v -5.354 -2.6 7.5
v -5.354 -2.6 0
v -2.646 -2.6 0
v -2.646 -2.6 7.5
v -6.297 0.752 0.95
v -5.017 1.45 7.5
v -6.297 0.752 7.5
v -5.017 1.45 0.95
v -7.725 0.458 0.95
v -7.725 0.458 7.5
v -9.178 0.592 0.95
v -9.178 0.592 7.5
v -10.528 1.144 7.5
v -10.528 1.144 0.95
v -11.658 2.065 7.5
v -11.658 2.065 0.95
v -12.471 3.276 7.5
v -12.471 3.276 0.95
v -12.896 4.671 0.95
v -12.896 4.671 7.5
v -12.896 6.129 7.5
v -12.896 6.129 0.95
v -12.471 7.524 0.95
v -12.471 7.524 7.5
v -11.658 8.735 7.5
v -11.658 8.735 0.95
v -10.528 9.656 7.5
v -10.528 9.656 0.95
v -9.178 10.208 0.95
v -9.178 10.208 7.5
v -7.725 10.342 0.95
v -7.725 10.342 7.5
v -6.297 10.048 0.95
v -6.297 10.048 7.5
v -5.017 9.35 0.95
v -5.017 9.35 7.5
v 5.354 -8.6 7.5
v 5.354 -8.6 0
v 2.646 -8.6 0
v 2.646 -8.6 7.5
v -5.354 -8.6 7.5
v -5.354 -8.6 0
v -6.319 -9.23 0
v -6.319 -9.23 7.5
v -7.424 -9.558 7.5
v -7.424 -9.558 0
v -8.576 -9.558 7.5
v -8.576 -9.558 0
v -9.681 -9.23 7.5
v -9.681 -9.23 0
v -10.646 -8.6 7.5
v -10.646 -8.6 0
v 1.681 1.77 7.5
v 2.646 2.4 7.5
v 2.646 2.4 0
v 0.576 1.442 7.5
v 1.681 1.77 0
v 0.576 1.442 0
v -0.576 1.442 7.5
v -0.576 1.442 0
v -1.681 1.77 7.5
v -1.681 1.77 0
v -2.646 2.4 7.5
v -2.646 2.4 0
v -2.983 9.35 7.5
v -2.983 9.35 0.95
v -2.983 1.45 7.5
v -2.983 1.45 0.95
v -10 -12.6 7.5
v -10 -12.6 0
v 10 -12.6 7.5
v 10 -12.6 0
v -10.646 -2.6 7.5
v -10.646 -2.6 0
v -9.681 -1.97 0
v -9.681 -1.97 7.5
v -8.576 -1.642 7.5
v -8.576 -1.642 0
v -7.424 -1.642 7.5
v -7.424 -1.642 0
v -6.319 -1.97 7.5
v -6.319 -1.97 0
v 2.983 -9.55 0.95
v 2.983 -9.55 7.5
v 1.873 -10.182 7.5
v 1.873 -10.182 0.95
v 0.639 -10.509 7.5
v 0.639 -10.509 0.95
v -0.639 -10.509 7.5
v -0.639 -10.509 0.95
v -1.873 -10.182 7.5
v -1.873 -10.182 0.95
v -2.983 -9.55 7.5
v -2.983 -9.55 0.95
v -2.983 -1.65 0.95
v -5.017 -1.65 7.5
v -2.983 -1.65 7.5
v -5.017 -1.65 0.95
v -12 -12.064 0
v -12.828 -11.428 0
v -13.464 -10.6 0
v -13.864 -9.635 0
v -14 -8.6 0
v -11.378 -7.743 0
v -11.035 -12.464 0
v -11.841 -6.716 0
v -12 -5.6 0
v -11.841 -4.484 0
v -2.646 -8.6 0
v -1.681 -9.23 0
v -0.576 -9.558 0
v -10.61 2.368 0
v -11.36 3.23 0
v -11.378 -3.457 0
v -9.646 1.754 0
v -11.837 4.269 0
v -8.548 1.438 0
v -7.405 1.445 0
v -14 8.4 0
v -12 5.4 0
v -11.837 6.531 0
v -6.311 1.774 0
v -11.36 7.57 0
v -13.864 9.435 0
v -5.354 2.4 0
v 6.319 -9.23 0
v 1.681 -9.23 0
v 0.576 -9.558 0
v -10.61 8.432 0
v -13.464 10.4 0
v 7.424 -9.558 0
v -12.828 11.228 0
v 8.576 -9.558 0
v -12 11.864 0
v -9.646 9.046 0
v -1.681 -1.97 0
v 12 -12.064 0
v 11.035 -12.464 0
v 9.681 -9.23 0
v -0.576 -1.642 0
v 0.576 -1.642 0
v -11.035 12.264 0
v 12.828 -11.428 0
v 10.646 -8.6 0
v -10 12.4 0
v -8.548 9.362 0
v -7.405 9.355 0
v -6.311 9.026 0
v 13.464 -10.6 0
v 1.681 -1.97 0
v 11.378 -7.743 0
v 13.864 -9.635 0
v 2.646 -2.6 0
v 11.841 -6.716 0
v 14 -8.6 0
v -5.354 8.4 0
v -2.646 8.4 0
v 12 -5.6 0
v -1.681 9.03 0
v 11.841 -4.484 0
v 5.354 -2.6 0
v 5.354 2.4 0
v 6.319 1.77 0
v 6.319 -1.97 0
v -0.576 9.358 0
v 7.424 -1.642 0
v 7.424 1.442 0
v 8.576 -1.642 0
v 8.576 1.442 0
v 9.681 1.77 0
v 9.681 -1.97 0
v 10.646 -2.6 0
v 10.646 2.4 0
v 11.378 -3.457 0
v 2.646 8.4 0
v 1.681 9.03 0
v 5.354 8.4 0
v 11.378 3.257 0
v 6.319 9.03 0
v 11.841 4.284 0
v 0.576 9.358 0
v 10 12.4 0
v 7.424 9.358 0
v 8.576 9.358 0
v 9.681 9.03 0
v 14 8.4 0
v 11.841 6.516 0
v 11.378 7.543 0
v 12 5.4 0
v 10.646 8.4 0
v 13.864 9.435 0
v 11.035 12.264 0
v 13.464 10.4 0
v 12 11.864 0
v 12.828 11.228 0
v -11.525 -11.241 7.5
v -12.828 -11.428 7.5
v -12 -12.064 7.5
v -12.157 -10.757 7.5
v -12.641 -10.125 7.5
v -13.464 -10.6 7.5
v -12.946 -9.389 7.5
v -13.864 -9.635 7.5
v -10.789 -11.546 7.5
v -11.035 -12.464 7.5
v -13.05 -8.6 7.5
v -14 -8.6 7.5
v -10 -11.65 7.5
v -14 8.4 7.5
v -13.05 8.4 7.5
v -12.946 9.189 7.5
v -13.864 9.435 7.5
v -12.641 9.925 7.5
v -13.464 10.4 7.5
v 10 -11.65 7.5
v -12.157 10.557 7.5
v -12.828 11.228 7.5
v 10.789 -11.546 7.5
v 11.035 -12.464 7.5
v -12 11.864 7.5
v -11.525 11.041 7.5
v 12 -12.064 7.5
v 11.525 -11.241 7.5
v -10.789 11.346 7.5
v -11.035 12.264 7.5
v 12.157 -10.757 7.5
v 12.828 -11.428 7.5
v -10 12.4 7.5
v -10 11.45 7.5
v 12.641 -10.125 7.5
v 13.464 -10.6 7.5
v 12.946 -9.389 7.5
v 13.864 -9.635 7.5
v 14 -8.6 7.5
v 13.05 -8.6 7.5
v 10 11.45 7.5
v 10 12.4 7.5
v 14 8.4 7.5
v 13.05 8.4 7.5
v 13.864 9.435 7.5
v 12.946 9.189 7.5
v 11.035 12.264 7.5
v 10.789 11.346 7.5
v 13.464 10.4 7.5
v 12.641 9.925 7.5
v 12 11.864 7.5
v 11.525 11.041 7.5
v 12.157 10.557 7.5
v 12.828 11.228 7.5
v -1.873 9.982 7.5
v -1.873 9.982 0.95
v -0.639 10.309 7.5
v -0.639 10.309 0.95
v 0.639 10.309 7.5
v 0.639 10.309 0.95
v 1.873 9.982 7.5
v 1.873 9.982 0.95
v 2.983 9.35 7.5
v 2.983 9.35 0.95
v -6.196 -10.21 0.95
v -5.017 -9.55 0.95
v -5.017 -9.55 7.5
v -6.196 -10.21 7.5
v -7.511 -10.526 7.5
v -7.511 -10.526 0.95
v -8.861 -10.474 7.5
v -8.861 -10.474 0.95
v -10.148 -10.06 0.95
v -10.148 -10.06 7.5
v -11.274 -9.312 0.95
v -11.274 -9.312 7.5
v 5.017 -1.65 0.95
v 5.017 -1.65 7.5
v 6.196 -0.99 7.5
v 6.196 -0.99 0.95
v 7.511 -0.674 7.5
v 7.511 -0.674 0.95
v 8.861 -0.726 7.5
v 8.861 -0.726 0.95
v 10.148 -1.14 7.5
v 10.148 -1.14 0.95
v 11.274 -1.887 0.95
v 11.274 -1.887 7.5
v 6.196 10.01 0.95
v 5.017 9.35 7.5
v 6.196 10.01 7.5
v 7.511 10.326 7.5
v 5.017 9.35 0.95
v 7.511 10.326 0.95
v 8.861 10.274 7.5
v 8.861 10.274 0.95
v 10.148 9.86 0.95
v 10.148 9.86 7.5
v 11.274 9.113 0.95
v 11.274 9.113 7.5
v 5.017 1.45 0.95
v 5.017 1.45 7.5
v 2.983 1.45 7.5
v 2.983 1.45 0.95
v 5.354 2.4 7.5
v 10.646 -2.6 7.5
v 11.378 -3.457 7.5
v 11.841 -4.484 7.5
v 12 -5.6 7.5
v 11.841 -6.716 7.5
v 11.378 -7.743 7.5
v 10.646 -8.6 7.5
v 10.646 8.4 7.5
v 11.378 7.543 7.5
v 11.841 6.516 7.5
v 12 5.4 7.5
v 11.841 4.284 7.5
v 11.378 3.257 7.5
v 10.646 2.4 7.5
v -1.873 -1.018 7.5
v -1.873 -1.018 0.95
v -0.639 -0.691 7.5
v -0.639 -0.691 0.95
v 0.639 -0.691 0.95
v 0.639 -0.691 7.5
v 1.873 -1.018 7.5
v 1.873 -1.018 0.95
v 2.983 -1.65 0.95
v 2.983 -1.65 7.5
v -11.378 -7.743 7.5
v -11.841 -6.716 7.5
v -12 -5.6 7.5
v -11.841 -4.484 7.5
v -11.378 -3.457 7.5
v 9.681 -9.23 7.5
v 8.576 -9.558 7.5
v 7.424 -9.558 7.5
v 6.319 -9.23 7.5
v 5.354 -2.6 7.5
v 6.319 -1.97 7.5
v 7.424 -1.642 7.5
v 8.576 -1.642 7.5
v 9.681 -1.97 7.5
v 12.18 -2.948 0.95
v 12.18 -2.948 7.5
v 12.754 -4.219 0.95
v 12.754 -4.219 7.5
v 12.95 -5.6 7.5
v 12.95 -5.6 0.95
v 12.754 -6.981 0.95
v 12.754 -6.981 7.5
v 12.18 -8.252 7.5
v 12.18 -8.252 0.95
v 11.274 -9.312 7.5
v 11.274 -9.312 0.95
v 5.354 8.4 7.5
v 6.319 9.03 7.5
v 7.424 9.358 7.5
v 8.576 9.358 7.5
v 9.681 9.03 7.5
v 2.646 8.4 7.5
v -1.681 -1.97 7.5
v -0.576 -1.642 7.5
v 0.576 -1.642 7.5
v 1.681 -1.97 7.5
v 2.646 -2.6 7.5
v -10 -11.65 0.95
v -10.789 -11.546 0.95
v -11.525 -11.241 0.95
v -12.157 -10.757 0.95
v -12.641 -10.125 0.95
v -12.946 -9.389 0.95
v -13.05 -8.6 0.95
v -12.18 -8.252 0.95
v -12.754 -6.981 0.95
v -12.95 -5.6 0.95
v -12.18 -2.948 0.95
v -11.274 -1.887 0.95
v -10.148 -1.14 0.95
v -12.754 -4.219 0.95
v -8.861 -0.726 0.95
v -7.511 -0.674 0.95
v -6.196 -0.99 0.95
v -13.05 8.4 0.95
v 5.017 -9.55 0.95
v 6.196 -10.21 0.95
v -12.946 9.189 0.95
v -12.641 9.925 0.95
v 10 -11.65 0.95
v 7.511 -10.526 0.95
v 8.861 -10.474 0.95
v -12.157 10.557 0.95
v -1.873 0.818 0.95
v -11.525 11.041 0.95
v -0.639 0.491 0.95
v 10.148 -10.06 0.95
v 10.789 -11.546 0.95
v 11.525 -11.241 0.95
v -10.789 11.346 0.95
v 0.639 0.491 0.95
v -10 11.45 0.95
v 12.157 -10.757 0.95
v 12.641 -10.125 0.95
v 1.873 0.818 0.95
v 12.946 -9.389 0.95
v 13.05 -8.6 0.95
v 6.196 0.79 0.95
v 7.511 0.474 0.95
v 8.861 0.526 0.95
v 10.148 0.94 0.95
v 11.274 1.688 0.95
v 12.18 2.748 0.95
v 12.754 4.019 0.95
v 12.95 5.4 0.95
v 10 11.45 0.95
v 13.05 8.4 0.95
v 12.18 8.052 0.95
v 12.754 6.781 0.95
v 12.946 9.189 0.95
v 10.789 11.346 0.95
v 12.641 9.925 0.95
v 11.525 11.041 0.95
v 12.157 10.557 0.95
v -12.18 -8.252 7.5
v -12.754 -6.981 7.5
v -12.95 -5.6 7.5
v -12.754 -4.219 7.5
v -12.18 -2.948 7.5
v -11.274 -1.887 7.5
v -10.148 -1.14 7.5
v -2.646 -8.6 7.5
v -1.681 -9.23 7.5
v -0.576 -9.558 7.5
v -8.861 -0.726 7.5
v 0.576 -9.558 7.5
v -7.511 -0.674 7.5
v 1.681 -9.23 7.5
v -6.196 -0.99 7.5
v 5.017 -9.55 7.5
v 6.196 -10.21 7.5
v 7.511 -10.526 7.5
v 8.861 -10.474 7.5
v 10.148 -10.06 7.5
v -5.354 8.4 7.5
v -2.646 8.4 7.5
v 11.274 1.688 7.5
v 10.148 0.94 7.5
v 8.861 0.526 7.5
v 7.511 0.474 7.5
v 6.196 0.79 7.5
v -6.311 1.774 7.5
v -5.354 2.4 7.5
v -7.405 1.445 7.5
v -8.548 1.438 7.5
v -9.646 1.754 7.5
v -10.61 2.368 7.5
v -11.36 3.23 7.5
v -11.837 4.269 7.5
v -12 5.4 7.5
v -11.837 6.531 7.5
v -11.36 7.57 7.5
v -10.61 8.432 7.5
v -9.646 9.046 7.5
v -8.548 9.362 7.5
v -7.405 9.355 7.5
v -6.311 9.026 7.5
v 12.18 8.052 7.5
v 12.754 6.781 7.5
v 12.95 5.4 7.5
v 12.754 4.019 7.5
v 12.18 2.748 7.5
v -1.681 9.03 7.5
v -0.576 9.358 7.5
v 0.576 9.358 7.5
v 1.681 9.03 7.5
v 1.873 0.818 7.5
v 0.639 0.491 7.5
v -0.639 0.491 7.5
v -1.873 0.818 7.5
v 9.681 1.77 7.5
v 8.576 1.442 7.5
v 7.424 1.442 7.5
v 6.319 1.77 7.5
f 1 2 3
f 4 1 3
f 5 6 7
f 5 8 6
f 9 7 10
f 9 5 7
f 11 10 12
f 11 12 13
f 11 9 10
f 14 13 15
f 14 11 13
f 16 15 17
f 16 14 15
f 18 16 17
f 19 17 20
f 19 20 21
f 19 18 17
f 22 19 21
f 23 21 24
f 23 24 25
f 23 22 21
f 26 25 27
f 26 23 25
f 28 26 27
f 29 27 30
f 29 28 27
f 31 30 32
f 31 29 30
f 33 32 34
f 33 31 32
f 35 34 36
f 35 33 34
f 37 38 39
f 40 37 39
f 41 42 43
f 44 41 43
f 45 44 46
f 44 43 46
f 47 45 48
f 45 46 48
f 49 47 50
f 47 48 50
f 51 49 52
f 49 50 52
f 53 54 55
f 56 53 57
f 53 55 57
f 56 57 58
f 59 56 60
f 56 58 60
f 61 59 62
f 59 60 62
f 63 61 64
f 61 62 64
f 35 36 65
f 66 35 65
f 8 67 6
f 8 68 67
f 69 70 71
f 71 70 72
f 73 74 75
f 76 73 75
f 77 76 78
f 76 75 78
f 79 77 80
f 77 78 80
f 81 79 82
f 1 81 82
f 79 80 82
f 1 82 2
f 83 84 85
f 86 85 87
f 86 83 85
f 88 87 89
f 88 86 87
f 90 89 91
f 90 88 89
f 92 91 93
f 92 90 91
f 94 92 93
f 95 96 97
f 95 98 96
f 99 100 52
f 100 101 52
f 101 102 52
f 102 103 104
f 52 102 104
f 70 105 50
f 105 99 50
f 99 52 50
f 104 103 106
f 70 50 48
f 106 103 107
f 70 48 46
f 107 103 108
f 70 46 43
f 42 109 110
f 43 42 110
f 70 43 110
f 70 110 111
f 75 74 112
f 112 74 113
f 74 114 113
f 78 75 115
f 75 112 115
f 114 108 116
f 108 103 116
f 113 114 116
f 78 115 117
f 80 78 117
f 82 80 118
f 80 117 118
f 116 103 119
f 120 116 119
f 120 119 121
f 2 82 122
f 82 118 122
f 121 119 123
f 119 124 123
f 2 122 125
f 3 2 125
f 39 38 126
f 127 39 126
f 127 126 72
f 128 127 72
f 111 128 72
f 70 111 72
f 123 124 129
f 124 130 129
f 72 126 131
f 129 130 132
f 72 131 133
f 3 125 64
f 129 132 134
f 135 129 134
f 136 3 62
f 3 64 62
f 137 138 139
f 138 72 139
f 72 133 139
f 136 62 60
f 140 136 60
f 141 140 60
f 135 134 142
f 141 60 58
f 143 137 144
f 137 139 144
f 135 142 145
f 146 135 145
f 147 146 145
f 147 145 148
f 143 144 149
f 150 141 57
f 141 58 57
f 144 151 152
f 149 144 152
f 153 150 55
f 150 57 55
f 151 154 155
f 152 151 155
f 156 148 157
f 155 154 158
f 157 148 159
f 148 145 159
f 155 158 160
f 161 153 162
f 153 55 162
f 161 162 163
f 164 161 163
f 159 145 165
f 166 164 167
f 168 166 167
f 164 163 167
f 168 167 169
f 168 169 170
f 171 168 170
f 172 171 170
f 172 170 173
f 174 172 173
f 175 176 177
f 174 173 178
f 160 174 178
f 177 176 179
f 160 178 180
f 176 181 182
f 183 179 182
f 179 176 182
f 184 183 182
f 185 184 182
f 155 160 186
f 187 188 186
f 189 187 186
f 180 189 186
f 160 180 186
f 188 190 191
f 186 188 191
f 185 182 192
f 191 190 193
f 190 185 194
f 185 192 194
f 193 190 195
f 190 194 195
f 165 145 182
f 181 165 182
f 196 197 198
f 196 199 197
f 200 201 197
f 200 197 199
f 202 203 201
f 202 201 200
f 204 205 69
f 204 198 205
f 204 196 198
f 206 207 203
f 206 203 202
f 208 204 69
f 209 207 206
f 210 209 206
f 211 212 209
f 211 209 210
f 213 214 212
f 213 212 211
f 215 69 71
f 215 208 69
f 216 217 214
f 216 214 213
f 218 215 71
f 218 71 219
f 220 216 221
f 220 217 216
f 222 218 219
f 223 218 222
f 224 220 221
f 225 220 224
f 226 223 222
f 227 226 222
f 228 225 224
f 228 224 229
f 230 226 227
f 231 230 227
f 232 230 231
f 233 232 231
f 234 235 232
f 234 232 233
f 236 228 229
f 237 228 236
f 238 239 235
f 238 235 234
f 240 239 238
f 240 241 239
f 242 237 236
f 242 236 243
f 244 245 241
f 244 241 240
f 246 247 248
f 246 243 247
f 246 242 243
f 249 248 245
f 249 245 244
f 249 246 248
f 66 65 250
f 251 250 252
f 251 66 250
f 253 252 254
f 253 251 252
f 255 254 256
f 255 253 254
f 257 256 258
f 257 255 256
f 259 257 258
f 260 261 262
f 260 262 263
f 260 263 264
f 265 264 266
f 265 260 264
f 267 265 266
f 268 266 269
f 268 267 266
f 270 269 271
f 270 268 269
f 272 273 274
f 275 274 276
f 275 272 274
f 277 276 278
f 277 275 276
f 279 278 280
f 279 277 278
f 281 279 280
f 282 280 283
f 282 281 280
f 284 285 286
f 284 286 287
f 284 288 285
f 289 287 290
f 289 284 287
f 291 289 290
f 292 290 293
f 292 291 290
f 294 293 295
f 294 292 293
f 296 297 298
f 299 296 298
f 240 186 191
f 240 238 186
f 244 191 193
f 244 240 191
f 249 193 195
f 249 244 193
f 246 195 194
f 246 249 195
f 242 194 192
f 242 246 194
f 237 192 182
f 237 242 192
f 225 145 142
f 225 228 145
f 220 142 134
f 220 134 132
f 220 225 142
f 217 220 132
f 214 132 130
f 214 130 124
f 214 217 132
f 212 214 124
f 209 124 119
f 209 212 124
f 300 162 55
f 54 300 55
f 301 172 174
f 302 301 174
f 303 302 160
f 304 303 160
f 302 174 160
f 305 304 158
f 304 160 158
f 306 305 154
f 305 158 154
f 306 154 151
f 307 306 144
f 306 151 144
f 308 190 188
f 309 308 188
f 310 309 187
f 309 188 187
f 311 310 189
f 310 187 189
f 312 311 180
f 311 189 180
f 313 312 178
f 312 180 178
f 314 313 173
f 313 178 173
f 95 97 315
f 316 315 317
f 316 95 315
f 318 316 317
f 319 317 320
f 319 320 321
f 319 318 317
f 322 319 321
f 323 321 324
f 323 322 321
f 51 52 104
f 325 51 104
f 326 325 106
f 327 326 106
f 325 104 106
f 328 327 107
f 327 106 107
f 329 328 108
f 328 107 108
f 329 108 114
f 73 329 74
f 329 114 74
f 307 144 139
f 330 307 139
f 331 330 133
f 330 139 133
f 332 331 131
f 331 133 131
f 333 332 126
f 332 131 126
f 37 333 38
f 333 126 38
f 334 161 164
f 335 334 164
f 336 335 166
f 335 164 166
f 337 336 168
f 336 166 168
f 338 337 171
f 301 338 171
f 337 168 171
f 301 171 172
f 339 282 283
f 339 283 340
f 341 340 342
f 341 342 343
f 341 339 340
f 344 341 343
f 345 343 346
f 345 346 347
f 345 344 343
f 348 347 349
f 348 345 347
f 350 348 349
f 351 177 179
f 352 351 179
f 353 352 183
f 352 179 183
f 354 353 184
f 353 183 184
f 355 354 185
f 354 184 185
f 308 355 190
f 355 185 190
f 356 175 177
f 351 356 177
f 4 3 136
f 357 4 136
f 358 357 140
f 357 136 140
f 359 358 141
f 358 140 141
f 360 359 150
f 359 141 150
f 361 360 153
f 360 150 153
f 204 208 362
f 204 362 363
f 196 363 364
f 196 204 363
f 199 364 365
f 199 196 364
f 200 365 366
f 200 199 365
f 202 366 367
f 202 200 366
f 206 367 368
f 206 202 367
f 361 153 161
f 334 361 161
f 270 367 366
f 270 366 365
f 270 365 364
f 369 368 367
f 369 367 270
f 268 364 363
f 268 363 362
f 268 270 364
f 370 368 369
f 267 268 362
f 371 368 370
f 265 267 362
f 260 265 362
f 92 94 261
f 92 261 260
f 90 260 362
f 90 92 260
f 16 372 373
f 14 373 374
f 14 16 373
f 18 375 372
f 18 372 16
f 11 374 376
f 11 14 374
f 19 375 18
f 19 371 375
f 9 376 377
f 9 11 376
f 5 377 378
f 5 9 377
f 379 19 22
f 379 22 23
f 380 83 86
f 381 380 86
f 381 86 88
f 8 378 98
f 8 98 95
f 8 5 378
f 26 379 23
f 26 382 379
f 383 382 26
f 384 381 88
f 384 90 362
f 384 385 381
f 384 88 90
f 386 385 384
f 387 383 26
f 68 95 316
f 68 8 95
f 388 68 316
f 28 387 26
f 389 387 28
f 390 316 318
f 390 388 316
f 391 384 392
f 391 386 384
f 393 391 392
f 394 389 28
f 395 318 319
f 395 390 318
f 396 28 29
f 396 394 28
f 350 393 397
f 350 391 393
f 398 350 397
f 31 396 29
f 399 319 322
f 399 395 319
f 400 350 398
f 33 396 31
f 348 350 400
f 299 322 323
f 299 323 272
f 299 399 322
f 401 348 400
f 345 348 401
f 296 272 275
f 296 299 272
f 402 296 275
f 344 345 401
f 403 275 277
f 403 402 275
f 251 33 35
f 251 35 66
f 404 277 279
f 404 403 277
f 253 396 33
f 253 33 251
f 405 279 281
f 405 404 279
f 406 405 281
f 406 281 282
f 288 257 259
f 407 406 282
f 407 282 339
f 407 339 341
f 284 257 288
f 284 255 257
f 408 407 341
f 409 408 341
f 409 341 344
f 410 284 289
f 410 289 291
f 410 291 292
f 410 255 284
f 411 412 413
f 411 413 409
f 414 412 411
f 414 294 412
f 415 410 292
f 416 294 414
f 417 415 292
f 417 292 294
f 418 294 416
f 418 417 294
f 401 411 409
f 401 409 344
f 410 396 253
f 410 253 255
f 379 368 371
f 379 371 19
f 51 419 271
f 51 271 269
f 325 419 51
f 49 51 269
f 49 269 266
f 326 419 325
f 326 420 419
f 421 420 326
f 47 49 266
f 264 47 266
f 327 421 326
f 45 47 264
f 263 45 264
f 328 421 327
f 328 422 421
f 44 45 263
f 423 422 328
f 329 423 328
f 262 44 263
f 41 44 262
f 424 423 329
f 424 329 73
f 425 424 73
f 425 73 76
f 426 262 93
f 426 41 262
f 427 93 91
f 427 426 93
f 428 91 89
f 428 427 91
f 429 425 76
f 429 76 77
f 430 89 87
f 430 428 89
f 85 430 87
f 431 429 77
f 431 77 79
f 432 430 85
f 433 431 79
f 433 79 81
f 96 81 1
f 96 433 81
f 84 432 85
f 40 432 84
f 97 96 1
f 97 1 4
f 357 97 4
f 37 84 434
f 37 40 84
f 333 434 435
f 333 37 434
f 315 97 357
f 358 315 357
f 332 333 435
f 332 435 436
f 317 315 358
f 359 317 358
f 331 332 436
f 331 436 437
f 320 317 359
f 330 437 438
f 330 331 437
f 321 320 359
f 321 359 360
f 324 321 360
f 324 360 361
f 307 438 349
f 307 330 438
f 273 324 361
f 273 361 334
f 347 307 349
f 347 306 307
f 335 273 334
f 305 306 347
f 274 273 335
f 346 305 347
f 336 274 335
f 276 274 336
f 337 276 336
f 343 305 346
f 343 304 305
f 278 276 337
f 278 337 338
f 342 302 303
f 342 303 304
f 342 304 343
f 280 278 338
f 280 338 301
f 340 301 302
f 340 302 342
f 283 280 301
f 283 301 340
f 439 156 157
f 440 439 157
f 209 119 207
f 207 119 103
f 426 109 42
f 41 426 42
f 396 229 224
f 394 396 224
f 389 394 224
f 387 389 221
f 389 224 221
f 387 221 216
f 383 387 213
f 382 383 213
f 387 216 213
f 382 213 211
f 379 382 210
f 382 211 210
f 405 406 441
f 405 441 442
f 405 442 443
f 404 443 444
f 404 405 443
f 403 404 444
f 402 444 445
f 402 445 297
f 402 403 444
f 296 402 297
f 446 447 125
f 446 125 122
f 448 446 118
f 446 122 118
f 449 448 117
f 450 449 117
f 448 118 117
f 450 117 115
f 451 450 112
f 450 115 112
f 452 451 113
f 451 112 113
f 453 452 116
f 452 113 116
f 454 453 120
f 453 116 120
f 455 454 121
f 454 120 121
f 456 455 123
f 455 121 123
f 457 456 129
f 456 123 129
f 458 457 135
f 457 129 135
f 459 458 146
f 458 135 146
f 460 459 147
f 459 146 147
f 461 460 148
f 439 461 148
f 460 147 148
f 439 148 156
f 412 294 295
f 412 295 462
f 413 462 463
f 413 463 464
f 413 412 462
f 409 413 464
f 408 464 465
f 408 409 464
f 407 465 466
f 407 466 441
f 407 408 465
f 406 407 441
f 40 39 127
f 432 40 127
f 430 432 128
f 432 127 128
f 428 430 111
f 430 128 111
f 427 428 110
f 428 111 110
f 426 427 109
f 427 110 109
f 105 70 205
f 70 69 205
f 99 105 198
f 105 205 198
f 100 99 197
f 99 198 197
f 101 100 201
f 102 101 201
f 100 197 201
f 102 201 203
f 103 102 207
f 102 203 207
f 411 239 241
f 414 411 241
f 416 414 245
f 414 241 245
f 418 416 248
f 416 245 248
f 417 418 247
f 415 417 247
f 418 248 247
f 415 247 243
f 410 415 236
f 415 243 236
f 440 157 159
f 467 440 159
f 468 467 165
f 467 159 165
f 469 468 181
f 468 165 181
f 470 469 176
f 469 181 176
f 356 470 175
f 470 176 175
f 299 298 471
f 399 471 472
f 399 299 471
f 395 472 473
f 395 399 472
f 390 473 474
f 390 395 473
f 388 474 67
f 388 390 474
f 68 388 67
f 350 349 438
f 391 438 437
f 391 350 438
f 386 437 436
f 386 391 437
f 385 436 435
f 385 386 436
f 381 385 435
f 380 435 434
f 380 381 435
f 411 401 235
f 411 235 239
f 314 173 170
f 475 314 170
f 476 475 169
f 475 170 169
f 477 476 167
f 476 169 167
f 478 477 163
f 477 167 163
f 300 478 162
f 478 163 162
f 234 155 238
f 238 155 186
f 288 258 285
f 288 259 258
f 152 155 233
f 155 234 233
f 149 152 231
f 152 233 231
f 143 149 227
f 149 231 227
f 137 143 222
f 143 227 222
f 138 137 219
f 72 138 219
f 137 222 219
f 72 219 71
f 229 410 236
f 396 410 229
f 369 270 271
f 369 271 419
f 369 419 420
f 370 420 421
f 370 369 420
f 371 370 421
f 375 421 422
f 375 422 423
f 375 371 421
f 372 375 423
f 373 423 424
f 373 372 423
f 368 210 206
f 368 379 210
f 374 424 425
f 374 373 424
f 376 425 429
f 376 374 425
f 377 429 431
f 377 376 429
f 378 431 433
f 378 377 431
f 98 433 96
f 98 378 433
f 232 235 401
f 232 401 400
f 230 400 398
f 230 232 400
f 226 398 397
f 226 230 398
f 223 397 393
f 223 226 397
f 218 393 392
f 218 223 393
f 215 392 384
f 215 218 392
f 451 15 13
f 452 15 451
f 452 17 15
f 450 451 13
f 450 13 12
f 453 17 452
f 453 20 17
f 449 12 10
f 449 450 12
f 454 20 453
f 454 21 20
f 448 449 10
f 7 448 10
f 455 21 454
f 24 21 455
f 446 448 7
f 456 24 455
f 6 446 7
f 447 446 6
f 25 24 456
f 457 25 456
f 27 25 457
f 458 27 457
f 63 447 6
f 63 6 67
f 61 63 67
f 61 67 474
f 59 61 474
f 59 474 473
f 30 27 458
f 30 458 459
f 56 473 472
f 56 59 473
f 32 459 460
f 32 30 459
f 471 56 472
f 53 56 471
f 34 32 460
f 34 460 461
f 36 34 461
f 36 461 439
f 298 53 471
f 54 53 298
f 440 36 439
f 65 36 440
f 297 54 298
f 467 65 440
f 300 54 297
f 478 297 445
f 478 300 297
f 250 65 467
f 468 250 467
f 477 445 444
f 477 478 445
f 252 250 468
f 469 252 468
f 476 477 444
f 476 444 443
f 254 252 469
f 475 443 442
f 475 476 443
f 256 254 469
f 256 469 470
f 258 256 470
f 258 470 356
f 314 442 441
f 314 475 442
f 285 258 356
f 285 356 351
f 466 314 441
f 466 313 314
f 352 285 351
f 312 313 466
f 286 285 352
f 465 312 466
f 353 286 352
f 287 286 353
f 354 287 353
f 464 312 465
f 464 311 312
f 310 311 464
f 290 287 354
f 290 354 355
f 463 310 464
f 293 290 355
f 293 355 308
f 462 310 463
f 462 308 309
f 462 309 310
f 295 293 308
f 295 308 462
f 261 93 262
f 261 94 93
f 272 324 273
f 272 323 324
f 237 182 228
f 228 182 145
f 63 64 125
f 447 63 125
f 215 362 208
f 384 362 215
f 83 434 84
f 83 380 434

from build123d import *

# Parameters (mm, degrees)
F1_DEPTH = 7.5
F2_R     = 4
F3_T     = -0.95


with BuildPart() as f1:
    # F0 (on Top) → F1 (new body)
    with BuildSketch(Plane.XY):
        Polygon((-11.2561800848, -12.5999993347), (14, -12.5999993347), (14, 2.4000006653), (14, 8.4000006653), (14, 12.4000006653), (-14, 12.4000006653), (-14, 5.4000006653), (-14, -12.5999993347), align=None)
        with BuildLine():
            ThreePointArc((2.6457513111, -8.5999993347), (0, -9.5999993347), (-2.6457513111, -8.5999993347))
            Line((-2.6457513111, -8.5999993347), (-5.3542486889, -8.5999993347))
            ThreePointArc((-5.3542486889, -8.5999993347), (-8, -9.5999993347), (-10.6457513111, -8.5999993347))
            ThreePointArc((-10.6457513111, -8.5999993347), (-12, -5.5999993347), (-10.6457513111, -2.5999993347))
            ThreePointArc((-10.6457513111, -2.5999993347), (-8, -1.5999993347), (-5.3542486889, -2.5999993347))
            Line((-5.3542486889, -2.5999993347), (-2.6457513111, -2.5999993347))
            ThreePointArc((-2.6457513111, -2.5999993347), (0, -1.5999993347), (2.6457513111, -2.5999993347))
            Line((2.6457513111, -2.5999993347), (5.3542486889, -2.5999993347))
            ThreePointArc((5.3542486889, -2.5999993347), (8, -1.5999993347), (10.6457513111, -2.5999993347))
            ThreePointArc((10.6457513111, -2.5999993347), (12, -5.5999993347), (10.6457513111, -8.5999993347))
            ThreePointArc((10.6457513111, -8.5999993347), (8, -9.5999993347), (5.3542486889, -8.5999993347))
            Line((5.3542486889, -8.5999993347), (2.6457513111, -8.5999993347))
        make_face(mode=Mode.SUBTRACT)
        with BuildLine():
            Line((-2.6457513111, 2.4000006653), (-5.3542486889, 2.4000006653))
            ThreePointArc((-5.3542486889, 2.4000006653), (-12, 5.4000006653), (-5.3542486889, 8.4000006653))
            Line((-5.3542486889, 8.4000006653), (-2.6457513111, 8.4000006653))
            ThreePointArc((-2.6457513111, 8.4000006653), (0, 9.4000006653), (2.6457513111, 8.4000006653))
            Line((2.6457513111, 8.4000006653), (5.3542486889, 8.4000006653))
            ThreePointArc((5.3542486889, 8.4000006653), (8, 9.4000006653), (10.6457513111, 8.4000006653))
            ThreePointArc((10.6457513111, 8.4000006653), (12, 5.4000006653), (10.6457513111, 2.4000006653))
            ThreePointArc((10.6457513111, 2.4000006653), (8, 1.4000006653), (5.3542486889, 2.4000006653))
            Line((5.3542486889, 2.4000006653), (2.6457513111, 2.4000006653))
            ThreePointArc((2.6457513111, 2.4000006653), (0, 1.4000006653), (-2.6457513111, 2.4000006653))
        make_face(mode=Mode.SUBTRACT)
    extrude(amount=F1_DEPTH)

    # F2
    f2_edges = [f1.edges().sort_by_distance(p)[0] for p in [
        (-14, 12.400001, 3.75),
        (14, -12.599999, 3.75),
        (-14, -12.599999, 3.75),
        (14, 12.400001, 3.75),
    ]]
    fillet(f2_edges, radius=F2_R)

    # F3
    f3_openings = [f1.faces().sort_by_distance(p)[0] for p in [
        (0, -0.099999, 7.5),
    ]]
    offset(amount=F3_T, openings=f3_openings)


solid = f1.part
